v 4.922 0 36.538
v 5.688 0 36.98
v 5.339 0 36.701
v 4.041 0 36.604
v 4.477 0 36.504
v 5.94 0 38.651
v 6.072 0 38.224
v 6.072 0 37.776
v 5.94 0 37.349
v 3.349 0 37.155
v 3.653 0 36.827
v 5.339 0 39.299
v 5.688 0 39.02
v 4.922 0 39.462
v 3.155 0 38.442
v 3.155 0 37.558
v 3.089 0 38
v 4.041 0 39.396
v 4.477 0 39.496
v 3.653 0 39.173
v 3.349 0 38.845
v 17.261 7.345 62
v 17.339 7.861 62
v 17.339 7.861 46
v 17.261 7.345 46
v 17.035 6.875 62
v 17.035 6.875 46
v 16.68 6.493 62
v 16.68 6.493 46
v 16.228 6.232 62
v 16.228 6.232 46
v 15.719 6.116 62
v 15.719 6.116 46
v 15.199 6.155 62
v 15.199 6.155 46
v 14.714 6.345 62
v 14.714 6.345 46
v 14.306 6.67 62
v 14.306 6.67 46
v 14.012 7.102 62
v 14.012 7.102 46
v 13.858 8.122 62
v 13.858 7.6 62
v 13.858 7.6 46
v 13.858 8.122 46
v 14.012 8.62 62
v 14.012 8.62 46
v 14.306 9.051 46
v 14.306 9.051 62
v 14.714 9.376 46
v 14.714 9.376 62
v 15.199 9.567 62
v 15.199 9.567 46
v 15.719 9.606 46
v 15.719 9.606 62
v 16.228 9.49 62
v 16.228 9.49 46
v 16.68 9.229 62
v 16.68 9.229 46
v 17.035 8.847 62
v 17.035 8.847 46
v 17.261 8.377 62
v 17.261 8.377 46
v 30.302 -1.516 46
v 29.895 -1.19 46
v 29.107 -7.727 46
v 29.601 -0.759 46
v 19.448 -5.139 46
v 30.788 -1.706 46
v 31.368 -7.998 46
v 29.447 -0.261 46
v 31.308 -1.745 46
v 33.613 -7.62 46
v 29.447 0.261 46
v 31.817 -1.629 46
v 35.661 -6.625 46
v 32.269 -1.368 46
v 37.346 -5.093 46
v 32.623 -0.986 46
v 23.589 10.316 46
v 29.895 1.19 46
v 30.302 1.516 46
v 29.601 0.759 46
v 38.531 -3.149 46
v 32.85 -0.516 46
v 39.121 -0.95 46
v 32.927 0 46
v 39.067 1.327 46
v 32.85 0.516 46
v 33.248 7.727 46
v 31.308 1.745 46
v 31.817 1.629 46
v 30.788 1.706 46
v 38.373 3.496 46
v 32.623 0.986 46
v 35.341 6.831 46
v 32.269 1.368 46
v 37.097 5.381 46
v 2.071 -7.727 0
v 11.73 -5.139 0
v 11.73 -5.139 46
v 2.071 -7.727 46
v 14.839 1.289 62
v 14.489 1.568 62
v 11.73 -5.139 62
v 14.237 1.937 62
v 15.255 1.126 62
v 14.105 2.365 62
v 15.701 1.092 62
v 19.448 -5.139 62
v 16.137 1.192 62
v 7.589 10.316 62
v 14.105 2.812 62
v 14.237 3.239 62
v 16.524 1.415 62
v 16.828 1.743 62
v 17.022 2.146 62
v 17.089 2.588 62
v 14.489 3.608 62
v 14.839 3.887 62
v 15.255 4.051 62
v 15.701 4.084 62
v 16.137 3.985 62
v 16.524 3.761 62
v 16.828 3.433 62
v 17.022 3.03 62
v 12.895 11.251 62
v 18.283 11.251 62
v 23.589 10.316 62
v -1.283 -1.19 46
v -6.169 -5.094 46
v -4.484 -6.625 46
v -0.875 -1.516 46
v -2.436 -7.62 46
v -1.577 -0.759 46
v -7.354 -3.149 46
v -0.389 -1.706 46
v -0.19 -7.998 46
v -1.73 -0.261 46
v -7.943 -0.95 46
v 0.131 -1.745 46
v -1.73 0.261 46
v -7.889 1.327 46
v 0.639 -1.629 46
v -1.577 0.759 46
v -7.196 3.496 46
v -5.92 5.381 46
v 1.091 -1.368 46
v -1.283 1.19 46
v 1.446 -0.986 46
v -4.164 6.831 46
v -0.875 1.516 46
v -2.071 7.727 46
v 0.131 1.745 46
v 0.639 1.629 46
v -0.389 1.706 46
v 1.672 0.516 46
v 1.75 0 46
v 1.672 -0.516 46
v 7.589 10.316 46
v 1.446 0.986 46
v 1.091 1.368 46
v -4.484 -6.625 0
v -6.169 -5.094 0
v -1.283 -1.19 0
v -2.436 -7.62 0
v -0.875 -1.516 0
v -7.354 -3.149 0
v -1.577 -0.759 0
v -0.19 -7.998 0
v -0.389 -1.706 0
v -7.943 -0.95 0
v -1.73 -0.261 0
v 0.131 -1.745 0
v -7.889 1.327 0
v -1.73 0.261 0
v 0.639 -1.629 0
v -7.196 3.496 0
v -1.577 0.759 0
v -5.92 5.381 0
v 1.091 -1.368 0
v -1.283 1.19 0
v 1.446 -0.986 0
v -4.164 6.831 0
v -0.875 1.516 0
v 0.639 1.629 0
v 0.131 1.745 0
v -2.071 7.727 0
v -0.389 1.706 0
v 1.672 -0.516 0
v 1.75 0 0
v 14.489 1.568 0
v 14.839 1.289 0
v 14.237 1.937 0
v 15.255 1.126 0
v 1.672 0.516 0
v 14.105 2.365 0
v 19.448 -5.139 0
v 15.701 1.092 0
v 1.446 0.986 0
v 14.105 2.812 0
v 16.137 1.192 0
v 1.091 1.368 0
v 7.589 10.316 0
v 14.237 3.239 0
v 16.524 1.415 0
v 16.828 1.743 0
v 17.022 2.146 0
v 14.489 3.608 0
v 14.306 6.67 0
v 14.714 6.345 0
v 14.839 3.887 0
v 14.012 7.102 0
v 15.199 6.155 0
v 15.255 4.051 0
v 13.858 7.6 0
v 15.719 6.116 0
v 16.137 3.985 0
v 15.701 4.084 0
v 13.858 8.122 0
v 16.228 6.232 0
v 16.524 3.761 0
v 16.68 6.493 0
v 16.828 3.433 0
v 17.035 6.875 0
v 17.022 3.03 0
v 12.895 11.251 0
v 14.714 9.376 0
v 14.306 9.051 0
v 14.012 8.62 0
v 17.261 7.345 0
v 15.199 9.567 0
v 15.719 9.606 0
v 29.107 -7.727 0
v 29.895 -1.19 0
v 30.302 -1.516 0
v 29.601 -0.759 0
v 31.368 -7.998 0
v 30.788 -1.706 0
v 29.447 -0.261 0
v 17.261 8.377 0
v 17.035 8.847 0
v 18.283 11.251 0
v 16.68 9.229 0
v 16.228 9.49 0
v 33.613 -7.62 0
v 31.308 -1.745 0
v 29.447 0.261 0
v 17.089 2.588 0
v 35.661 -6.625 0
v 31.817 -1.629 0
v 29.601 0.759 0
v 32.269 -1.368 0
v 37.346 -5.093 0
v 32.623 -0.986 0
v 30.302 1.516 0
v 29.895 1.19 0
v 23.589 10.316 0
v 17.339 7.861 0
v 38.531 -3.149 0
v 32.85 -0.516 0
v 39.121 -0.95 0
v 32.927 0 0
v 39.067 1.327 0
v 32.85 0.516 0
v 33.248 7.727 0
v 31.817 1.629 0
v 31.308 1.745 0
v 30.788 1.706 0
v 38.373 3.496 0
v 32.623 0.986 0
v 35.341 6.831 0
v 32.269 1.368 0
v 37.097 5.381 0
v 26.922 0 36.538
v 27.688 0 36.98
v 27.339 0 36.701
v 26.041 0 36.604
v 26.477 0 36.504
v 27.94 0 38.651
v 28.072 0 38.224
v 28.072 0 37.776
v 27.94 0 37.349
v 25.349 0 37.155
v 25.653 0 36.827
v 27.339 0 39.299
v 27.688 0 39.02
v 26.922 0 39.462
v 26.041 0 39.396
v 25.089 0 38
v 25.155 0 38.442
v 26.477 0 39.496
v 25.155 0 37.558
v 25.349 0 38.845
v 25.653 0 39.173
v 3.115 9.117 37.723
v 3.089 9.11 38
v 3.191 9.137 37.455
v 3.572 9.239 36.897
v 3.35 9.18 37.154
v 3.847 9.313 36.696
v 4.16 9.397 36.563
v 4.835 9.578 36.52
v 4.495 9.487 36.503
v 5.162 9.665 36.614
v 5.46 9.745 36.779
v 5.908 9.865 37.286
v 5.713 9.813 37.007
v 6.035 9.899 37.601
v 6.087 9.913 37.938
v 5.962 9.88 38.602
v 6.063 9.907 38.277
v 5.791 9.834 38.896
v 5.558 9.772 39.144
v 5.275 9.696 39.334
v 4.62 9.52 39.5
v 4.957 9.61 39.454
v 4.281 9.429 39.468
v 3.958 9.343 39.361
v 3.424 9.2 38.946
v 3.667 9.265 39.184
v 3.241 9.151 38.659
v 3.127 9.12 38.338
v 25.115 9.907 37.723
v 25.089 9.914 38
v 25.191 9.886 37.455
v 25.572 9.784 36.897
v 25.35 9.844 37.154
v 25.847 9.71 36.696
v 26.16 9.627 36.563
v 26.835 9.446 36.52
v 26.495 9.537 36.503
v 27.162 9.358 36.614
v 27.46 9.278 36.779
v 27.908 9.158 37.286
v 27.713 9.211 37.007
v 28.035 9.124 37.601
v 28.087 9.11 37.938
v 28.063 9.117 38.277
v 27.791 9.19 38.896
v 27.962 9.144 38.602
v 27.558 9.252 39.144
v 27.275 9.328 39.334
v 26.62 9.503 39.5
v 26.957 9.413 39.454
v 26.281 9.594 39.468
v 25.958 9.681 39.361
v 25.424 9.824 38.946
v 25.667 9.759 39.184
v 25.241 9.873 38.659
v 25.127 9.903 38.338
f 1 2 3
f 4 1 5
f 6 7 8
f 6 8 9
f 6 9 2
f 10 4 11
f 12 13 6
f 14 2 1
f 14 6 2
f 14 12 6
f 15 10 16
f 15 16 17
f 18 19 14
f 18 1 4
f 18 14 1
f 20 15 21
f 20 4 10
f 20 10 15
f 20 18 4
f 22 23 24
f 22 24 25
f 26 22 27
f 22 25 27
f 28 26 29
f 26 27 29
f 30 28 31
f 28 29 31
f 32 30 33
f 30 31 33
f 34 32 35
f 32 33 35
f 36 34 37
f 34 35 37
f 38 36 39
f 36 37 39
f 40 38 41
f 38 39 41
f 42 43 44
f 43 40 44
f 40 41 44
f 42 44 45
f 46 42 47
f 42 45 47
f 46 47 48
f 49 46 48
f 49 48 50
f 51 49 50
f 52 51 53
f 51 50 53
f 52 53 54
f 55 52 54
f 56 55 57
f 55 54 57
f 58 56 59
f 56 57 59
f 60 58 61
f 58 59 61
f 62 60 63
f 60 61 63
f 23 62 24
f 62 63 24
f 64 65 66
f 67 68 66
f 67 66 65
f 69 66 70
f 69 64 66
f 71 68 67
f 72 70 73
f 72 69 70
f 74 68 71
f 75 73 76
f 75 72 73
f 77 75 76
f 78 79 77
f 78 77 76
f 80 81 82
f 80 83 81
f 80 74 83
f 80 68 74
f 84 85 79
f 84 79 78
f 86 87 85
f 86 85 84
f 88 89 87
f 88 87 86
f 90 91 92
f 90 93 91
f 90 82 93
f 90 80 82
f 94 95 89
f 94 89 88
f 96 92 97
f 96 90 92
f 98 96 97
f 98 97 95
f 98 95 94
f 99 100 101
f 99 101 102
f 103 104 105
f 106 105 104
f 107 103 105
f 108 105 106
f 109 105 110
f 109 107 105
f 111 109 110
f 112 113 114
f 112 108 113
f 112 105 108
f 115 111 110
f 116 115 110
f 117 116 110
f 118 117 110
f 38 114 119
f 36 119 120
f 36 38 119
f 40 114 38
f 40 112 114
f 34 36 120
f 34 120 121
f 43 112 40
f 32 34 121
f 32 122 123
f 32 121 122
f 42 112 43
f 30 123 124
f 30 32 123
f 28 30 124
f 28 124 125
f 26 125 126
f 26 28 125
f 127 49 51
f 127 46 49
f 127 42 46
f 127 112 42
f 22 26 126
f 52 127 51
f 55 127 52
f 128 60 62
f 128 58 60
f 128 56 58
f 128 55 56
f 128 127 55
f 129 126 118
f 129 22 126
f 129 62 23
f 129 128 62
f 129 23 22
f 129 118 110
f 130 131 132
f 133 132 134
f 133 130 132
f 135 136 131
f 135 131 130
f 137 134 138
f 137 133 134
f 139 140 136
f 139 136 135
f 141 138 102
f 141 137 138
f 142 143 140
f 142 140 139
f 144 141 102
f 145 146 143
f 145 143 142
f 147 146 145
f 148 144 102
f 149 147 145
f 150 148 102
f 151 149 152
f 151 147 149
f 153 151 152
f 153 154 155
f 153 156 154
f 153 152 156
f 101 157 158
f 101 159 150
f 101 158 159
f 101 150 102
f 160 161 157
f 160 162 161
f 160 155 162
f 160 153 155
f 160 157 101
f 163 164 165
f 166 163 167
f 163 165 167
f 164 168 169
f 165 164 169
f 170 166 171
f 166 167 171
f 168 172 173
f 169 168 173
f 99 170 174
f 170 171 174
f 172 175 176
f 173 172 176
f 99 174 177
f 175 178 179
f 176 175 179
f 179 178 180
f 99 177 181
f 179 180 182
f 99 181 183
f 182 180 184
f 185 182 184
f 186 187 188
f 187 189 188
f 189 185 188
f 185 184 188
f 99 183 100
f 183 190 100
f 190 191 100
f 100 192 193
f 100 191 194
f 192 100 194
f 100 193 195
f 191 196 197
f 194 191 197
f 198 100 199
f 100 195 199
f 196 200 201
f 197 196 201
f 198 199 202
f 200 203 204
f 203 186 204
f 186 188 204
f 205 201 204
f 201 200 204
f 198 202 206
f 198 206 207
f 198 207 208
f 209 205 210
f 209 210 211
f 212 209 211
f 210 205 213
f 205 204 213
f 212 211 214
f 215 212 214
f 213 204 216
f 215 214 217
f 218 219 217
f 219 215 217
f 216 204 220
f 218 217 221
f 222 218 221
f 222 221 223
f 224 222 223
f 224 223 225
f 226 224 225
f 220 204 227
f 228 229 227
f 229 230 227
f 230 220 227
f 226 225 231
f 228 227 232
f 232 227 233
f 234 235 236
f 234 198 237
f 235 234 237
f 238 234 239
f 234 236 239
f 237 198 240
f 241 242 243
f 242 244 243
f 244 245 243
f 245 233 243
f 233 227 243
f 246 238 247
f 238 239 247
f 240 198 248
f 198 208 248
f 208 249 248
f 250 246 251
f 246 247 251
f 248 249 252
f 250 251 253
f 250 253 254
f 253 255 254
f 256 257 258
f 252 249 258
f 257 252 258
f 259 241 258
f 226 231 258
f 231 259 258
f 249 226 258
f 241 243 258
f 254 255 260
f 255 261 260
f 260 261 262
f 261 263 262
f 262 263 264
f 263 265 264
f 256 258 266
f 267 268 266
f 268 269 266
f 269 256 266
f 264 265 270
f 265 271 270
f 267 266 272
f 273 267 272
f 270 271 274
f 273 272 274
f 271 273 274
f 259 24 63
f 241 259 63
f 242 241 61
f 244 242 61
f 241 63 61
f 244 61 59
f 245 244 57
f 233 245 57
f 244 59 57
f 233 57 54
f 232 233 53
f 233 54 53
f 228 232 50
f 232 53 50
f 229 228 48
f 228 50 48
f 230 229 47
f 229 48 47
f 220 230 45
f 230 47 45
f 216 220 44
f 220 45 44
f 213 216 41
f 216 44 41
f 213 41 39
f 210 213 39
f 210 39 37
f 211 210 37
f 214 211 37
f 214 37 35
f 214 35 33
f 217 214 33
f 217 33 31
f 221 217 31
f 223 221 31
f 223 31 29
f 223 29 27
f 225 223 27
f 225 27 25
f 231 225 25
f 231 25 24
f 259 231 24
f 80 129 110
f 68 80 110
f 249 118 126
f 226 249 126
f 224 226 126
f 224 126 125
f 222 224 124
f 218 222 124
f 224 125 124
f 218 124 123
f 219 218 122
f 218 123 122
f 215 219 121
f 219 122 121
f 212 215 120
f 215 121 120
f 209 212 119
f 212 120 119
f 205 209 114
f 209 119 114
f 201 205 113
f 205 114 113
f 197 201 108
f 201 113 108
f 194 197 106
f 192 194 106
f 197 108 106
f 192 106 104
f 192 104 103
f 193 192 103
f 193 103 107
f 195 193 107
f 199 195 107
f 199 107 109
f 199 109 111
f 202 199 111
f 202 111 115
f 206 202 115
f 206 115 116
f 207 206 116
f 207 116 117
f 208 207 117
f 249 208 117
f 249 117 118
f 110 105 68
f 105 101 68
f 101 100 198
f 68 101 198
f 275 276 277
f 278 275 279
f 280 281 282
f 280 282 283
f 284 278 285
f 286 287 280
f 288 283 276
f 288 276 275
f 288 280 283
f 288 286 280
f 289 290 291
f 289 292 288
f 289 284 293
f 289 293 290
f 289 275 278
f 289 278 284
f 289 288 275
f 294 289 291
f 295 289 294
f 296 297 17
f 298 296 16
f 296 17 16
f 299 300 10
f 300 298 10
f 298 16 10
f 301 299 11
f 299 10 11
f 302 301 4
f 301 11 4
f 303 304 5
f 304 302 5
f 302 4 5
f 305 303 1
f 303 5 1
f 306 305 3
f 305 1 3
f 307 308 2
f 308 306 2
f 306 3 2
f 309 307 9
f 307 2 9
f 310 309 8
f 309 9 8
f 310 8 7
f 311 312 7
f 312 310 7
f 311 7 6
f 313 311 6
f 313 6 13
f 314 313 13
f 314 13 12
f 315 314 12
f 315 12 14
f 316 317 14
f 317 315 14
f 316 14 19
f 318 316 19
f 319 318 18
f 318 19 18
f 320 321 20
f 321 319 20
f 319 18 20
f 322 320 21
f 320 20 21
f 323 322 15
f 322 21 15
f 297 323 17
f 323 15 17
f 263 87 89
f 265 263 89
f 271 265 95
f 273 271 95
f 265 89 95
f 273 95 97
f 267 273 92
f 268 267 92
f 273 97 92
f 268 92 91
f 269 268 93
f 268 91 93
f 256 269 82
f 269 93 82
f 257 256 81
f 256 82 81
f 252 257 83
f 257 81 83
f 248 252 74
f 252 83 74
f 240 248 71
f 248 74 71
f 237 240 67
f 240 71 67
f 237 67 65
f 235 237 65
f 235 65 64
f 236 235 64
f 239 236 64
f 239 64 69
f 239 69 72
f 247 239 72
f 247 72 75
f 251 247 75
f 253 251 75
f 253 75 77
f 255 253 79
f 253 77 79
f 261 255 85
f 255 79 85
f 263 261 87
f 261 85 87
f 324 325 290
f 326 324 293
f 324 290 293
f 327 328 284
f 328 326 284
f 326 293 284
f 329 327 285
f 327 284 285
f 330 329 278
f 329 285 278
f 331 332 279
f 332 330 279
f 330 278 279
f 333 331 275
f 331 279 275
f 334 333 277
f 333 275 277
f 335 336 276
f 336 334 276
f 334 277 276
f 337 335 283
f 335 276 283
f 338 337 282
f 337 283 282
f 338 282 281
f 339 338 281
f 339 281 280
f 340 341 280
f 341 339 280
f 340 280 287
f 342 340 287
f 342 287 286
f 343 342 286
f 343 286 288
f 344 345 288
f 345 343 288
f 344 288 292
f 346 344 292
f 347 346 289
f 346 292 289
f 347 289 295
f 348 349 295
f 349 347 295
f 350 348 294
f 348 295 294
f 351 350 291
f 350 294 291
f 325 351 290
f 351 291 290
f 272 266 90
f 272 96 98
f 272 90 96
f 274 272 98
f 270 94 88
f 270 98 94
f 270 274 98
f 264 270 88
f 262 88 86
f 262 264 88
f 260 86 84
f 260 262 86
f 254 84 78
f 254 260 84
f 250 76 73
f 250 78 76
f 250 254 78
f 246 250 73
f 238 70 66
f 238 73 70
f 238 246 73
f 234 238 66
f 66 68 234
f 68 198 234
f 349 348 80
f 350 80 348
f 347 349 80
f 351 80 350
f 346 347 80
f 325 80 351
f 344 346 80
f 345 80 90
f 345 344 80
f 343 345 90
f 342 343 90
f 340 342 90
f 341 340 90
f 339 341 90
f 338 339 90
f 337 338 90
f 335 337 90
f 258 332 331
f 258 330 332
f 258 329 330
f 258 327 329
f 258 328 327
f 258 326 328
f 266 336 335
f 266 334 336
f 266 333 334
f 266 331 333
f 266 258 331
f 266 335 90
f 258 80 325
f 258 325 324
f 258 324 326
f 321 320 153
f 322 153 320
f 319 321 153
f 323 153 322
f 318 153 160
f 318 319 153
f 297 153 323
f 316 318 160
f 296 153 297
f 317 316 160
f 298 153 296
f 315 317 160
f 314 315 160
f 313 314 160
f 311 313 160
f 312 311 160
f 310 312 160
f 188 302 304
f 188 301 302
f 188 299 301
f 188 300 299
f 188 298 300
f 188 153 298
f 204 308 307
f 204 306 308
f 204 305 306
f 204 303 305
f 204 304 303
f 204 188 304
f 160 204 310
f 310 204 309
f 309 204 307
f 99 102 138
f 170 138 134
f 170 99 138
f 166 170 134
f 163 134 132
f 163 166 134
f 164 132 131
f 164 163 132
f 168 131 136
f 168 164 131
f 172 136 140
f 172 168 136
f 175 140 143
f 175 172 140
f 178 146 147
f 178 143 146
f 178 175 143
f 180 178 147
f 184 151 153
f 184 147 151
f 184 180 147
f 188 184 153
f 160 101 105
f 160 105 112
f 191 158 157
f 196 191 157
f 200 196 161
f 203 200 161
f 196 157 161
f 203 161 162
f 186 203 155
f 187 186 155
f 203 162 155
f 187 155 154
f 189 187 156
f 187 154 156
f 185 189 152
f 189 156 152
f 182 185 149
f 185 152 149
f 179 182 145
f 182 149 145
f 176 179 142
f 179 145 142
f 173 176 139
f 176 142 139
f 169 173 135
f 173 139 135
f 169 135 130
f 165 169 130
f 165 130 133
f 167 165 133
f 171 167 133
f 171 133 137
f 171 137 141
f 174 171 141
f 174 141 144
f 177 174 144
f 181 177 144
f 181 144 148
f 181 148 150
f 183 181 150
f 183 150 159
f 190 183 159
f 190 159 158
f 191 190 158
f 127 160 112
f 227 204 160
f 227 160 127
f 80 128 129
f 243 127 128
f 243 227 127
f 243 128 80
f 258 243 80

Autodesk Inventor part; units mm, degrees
ref_plane "YZ Plane" through (0, 0, 0) normal (1, 0, 0) x (0, 1, 0)
ref_plane "XZ Plane" through (0, 0, 0) normal (0, 1, 0) x (-1, 0, 0)
ref_plane "XY Plane" through (0, 0, 0) normal (0, 0, 1) x (1, 0, 0)
sketch "Sketch1" plane through (0, 0, 0) normal (0, 0, 1) x (1, 0, 0)
  circle A0 centre (31.1774, 0) radius 8 construction
  circle A1 centre (0, 0) radius 8 construction
  line L0 (7.5887, 10.3156) -> (11.7298, -5.1392) construction
  line L1 (11.7298, -5.1392) -> (2.0706, -7.7274)
  line L2 (-2.0706, 7.7274) -> (7.5887, 10.3156)
  line L3 (19.4476, -5.1392) -> (23.5887, 10.3156) construction
  line L4 (23.5887, 10.3156) -> (33.248, 7.7274)
  line L5 (19.4476, -5.1392) -> (29.1069, -7.7274)
  line L6 (7.5887, 10.3156) -> (23.5887, 10.3156) construction
  line L7 (11.7298, -5.1392) -> (19.4476, -5.1392)
  arc A2 (-2.0706, 7.7274) -> (2.0706, -7.7274) centre (0, 0) ccw
  arc A3 (29.1069, -7.7274) -> (33.248, 7.7274) centre (31.1774, 0) ccw
  arc A4 (23.5887, 10.3156) -> (7.5887, 10.3156) centre (15.5887, -19.5408) ccw
  point P0 (15.5887, 10.3156)
  dimension "d0" = 16
  dimension "d1" = 16
  dimension "d2" = 16
  dimension "d3" = 10
  dimension "d4" = 10
  dimension "d5" = 16
  dimension "d6" = 16
  dimension "d7" = 75
extrude "Extrusion1" add sketch "Sketch1" along normal blind 46
sketch "Sketch2" plane through (0, 0, 46) normal (0, 0, 1) x (1, 0, 0)
  arc A0 (-2.0706, 7.7274) -> (2.0706, -7.7274) centre (0, 0) ccw projected
  arc A1 (29.1069, -7.7274) -> (33.248, 7.7274) centre (31.1774, 0) ccw projected
  line L0 (11.7298, -5.1392) -> (19.4476, -5.1392) projected
  circle A2 centre (0, 0) radius 1.75
  circle A3 centre (31.1774, 0) radius 1.75
  circle A4 centre (15.5887, 7.8608) radius 1.75
  point P0 (0, 0)
  point P1 (15.5887, -5.1392)
  dimension "d11" = 3.5
  dimension "d12" = 3.5
  dimension "d13" = 3.5
  dimension "d14" = 13
extrude "Extrusion2" cut sketch "Sketch2" against normal through all
sketch "Sketch3" plane through (0, 0, 46) normal (0, 0, 1) x (1, 0, 0)
  arc A0 (23.5887, 10.3156) -> (7.5887, 10.3156) centre (15.5887, -19.5408) ccw projected
  line L0 (7.5887, 10.3156) -> (23.5887, 10.3156)
  line L1 (19.4476, -5.1392) -> (29.1069, -7.7274) projected
  line L2 (23.5887, 10.3156) -> (19.4476, -5.1392)
  line L3 (11.7298, -5.1392) -> (19.4476, -5.1392) projected
  line L4 (19.4476, -5.1392) -> (11.7298, -5.1392)
  line L5 (11.7298, -5.1392) -> (7.5887, 10.3156)
  circle A1 centre (15.5887, 7.8608) radius 1.75 projected
  point P0 (0, 0)
extrude "Extrusion3" add sketch "Sketch3" along normal blind 16
sketch "Sketch4" plane through (0, 0, 62) normal (0, 0, 1) x (1, 0, 0)
  arc A0 (23.5887, 10.3156) -> (7.5887, 10.3156) centre (15.5887, -19.5408) ccw construction
  line L0 (7.5887, 10.3156) -> (23.5887, 10.3156) construction
  line L1 (23.5887, 10.3156) -> (15.5887, 10.3156) construction
  line L2 (11.7298, -5.1392) -> (19.4476, -5.1392) construction
  line L3 (15.5887, -5.1392) -> (15.5887, 10.3156) construction
  circle A1 centre (15.5887, 2.5882) radius 1.5
  point P0 (0, 0)
  dimension "d19" = 3
extrude "Extrusion4" cut sketch "Sketch4" against normal through all
sketch "Sketch7" plane through (0, 0, 0) normal (0, 1, 0) x (-1, 0, 0)
  circle A0 centre (-26.5887, 38) radius 1.5
  circle A1 centre (-4.5887, 38) radius 1.5
  line L0 (-7.5887, 62) -> (-23.5887, 62) construction
  line L1 (-26.5887, 38) -> (-4.5887, 38) construction
  point P0 (0, 0)
  point P1 (-15.5887, 62)
  point P2 (-15.5887, 38)
  dimension "d28" = 3
  dimension "d29" = 3
  dimension "d30" = 22
  dimension "d31" = 24
extrude "Extrusion7" cut sketch "Sketch7" along normal through all
properties material "ABS Plastic"
